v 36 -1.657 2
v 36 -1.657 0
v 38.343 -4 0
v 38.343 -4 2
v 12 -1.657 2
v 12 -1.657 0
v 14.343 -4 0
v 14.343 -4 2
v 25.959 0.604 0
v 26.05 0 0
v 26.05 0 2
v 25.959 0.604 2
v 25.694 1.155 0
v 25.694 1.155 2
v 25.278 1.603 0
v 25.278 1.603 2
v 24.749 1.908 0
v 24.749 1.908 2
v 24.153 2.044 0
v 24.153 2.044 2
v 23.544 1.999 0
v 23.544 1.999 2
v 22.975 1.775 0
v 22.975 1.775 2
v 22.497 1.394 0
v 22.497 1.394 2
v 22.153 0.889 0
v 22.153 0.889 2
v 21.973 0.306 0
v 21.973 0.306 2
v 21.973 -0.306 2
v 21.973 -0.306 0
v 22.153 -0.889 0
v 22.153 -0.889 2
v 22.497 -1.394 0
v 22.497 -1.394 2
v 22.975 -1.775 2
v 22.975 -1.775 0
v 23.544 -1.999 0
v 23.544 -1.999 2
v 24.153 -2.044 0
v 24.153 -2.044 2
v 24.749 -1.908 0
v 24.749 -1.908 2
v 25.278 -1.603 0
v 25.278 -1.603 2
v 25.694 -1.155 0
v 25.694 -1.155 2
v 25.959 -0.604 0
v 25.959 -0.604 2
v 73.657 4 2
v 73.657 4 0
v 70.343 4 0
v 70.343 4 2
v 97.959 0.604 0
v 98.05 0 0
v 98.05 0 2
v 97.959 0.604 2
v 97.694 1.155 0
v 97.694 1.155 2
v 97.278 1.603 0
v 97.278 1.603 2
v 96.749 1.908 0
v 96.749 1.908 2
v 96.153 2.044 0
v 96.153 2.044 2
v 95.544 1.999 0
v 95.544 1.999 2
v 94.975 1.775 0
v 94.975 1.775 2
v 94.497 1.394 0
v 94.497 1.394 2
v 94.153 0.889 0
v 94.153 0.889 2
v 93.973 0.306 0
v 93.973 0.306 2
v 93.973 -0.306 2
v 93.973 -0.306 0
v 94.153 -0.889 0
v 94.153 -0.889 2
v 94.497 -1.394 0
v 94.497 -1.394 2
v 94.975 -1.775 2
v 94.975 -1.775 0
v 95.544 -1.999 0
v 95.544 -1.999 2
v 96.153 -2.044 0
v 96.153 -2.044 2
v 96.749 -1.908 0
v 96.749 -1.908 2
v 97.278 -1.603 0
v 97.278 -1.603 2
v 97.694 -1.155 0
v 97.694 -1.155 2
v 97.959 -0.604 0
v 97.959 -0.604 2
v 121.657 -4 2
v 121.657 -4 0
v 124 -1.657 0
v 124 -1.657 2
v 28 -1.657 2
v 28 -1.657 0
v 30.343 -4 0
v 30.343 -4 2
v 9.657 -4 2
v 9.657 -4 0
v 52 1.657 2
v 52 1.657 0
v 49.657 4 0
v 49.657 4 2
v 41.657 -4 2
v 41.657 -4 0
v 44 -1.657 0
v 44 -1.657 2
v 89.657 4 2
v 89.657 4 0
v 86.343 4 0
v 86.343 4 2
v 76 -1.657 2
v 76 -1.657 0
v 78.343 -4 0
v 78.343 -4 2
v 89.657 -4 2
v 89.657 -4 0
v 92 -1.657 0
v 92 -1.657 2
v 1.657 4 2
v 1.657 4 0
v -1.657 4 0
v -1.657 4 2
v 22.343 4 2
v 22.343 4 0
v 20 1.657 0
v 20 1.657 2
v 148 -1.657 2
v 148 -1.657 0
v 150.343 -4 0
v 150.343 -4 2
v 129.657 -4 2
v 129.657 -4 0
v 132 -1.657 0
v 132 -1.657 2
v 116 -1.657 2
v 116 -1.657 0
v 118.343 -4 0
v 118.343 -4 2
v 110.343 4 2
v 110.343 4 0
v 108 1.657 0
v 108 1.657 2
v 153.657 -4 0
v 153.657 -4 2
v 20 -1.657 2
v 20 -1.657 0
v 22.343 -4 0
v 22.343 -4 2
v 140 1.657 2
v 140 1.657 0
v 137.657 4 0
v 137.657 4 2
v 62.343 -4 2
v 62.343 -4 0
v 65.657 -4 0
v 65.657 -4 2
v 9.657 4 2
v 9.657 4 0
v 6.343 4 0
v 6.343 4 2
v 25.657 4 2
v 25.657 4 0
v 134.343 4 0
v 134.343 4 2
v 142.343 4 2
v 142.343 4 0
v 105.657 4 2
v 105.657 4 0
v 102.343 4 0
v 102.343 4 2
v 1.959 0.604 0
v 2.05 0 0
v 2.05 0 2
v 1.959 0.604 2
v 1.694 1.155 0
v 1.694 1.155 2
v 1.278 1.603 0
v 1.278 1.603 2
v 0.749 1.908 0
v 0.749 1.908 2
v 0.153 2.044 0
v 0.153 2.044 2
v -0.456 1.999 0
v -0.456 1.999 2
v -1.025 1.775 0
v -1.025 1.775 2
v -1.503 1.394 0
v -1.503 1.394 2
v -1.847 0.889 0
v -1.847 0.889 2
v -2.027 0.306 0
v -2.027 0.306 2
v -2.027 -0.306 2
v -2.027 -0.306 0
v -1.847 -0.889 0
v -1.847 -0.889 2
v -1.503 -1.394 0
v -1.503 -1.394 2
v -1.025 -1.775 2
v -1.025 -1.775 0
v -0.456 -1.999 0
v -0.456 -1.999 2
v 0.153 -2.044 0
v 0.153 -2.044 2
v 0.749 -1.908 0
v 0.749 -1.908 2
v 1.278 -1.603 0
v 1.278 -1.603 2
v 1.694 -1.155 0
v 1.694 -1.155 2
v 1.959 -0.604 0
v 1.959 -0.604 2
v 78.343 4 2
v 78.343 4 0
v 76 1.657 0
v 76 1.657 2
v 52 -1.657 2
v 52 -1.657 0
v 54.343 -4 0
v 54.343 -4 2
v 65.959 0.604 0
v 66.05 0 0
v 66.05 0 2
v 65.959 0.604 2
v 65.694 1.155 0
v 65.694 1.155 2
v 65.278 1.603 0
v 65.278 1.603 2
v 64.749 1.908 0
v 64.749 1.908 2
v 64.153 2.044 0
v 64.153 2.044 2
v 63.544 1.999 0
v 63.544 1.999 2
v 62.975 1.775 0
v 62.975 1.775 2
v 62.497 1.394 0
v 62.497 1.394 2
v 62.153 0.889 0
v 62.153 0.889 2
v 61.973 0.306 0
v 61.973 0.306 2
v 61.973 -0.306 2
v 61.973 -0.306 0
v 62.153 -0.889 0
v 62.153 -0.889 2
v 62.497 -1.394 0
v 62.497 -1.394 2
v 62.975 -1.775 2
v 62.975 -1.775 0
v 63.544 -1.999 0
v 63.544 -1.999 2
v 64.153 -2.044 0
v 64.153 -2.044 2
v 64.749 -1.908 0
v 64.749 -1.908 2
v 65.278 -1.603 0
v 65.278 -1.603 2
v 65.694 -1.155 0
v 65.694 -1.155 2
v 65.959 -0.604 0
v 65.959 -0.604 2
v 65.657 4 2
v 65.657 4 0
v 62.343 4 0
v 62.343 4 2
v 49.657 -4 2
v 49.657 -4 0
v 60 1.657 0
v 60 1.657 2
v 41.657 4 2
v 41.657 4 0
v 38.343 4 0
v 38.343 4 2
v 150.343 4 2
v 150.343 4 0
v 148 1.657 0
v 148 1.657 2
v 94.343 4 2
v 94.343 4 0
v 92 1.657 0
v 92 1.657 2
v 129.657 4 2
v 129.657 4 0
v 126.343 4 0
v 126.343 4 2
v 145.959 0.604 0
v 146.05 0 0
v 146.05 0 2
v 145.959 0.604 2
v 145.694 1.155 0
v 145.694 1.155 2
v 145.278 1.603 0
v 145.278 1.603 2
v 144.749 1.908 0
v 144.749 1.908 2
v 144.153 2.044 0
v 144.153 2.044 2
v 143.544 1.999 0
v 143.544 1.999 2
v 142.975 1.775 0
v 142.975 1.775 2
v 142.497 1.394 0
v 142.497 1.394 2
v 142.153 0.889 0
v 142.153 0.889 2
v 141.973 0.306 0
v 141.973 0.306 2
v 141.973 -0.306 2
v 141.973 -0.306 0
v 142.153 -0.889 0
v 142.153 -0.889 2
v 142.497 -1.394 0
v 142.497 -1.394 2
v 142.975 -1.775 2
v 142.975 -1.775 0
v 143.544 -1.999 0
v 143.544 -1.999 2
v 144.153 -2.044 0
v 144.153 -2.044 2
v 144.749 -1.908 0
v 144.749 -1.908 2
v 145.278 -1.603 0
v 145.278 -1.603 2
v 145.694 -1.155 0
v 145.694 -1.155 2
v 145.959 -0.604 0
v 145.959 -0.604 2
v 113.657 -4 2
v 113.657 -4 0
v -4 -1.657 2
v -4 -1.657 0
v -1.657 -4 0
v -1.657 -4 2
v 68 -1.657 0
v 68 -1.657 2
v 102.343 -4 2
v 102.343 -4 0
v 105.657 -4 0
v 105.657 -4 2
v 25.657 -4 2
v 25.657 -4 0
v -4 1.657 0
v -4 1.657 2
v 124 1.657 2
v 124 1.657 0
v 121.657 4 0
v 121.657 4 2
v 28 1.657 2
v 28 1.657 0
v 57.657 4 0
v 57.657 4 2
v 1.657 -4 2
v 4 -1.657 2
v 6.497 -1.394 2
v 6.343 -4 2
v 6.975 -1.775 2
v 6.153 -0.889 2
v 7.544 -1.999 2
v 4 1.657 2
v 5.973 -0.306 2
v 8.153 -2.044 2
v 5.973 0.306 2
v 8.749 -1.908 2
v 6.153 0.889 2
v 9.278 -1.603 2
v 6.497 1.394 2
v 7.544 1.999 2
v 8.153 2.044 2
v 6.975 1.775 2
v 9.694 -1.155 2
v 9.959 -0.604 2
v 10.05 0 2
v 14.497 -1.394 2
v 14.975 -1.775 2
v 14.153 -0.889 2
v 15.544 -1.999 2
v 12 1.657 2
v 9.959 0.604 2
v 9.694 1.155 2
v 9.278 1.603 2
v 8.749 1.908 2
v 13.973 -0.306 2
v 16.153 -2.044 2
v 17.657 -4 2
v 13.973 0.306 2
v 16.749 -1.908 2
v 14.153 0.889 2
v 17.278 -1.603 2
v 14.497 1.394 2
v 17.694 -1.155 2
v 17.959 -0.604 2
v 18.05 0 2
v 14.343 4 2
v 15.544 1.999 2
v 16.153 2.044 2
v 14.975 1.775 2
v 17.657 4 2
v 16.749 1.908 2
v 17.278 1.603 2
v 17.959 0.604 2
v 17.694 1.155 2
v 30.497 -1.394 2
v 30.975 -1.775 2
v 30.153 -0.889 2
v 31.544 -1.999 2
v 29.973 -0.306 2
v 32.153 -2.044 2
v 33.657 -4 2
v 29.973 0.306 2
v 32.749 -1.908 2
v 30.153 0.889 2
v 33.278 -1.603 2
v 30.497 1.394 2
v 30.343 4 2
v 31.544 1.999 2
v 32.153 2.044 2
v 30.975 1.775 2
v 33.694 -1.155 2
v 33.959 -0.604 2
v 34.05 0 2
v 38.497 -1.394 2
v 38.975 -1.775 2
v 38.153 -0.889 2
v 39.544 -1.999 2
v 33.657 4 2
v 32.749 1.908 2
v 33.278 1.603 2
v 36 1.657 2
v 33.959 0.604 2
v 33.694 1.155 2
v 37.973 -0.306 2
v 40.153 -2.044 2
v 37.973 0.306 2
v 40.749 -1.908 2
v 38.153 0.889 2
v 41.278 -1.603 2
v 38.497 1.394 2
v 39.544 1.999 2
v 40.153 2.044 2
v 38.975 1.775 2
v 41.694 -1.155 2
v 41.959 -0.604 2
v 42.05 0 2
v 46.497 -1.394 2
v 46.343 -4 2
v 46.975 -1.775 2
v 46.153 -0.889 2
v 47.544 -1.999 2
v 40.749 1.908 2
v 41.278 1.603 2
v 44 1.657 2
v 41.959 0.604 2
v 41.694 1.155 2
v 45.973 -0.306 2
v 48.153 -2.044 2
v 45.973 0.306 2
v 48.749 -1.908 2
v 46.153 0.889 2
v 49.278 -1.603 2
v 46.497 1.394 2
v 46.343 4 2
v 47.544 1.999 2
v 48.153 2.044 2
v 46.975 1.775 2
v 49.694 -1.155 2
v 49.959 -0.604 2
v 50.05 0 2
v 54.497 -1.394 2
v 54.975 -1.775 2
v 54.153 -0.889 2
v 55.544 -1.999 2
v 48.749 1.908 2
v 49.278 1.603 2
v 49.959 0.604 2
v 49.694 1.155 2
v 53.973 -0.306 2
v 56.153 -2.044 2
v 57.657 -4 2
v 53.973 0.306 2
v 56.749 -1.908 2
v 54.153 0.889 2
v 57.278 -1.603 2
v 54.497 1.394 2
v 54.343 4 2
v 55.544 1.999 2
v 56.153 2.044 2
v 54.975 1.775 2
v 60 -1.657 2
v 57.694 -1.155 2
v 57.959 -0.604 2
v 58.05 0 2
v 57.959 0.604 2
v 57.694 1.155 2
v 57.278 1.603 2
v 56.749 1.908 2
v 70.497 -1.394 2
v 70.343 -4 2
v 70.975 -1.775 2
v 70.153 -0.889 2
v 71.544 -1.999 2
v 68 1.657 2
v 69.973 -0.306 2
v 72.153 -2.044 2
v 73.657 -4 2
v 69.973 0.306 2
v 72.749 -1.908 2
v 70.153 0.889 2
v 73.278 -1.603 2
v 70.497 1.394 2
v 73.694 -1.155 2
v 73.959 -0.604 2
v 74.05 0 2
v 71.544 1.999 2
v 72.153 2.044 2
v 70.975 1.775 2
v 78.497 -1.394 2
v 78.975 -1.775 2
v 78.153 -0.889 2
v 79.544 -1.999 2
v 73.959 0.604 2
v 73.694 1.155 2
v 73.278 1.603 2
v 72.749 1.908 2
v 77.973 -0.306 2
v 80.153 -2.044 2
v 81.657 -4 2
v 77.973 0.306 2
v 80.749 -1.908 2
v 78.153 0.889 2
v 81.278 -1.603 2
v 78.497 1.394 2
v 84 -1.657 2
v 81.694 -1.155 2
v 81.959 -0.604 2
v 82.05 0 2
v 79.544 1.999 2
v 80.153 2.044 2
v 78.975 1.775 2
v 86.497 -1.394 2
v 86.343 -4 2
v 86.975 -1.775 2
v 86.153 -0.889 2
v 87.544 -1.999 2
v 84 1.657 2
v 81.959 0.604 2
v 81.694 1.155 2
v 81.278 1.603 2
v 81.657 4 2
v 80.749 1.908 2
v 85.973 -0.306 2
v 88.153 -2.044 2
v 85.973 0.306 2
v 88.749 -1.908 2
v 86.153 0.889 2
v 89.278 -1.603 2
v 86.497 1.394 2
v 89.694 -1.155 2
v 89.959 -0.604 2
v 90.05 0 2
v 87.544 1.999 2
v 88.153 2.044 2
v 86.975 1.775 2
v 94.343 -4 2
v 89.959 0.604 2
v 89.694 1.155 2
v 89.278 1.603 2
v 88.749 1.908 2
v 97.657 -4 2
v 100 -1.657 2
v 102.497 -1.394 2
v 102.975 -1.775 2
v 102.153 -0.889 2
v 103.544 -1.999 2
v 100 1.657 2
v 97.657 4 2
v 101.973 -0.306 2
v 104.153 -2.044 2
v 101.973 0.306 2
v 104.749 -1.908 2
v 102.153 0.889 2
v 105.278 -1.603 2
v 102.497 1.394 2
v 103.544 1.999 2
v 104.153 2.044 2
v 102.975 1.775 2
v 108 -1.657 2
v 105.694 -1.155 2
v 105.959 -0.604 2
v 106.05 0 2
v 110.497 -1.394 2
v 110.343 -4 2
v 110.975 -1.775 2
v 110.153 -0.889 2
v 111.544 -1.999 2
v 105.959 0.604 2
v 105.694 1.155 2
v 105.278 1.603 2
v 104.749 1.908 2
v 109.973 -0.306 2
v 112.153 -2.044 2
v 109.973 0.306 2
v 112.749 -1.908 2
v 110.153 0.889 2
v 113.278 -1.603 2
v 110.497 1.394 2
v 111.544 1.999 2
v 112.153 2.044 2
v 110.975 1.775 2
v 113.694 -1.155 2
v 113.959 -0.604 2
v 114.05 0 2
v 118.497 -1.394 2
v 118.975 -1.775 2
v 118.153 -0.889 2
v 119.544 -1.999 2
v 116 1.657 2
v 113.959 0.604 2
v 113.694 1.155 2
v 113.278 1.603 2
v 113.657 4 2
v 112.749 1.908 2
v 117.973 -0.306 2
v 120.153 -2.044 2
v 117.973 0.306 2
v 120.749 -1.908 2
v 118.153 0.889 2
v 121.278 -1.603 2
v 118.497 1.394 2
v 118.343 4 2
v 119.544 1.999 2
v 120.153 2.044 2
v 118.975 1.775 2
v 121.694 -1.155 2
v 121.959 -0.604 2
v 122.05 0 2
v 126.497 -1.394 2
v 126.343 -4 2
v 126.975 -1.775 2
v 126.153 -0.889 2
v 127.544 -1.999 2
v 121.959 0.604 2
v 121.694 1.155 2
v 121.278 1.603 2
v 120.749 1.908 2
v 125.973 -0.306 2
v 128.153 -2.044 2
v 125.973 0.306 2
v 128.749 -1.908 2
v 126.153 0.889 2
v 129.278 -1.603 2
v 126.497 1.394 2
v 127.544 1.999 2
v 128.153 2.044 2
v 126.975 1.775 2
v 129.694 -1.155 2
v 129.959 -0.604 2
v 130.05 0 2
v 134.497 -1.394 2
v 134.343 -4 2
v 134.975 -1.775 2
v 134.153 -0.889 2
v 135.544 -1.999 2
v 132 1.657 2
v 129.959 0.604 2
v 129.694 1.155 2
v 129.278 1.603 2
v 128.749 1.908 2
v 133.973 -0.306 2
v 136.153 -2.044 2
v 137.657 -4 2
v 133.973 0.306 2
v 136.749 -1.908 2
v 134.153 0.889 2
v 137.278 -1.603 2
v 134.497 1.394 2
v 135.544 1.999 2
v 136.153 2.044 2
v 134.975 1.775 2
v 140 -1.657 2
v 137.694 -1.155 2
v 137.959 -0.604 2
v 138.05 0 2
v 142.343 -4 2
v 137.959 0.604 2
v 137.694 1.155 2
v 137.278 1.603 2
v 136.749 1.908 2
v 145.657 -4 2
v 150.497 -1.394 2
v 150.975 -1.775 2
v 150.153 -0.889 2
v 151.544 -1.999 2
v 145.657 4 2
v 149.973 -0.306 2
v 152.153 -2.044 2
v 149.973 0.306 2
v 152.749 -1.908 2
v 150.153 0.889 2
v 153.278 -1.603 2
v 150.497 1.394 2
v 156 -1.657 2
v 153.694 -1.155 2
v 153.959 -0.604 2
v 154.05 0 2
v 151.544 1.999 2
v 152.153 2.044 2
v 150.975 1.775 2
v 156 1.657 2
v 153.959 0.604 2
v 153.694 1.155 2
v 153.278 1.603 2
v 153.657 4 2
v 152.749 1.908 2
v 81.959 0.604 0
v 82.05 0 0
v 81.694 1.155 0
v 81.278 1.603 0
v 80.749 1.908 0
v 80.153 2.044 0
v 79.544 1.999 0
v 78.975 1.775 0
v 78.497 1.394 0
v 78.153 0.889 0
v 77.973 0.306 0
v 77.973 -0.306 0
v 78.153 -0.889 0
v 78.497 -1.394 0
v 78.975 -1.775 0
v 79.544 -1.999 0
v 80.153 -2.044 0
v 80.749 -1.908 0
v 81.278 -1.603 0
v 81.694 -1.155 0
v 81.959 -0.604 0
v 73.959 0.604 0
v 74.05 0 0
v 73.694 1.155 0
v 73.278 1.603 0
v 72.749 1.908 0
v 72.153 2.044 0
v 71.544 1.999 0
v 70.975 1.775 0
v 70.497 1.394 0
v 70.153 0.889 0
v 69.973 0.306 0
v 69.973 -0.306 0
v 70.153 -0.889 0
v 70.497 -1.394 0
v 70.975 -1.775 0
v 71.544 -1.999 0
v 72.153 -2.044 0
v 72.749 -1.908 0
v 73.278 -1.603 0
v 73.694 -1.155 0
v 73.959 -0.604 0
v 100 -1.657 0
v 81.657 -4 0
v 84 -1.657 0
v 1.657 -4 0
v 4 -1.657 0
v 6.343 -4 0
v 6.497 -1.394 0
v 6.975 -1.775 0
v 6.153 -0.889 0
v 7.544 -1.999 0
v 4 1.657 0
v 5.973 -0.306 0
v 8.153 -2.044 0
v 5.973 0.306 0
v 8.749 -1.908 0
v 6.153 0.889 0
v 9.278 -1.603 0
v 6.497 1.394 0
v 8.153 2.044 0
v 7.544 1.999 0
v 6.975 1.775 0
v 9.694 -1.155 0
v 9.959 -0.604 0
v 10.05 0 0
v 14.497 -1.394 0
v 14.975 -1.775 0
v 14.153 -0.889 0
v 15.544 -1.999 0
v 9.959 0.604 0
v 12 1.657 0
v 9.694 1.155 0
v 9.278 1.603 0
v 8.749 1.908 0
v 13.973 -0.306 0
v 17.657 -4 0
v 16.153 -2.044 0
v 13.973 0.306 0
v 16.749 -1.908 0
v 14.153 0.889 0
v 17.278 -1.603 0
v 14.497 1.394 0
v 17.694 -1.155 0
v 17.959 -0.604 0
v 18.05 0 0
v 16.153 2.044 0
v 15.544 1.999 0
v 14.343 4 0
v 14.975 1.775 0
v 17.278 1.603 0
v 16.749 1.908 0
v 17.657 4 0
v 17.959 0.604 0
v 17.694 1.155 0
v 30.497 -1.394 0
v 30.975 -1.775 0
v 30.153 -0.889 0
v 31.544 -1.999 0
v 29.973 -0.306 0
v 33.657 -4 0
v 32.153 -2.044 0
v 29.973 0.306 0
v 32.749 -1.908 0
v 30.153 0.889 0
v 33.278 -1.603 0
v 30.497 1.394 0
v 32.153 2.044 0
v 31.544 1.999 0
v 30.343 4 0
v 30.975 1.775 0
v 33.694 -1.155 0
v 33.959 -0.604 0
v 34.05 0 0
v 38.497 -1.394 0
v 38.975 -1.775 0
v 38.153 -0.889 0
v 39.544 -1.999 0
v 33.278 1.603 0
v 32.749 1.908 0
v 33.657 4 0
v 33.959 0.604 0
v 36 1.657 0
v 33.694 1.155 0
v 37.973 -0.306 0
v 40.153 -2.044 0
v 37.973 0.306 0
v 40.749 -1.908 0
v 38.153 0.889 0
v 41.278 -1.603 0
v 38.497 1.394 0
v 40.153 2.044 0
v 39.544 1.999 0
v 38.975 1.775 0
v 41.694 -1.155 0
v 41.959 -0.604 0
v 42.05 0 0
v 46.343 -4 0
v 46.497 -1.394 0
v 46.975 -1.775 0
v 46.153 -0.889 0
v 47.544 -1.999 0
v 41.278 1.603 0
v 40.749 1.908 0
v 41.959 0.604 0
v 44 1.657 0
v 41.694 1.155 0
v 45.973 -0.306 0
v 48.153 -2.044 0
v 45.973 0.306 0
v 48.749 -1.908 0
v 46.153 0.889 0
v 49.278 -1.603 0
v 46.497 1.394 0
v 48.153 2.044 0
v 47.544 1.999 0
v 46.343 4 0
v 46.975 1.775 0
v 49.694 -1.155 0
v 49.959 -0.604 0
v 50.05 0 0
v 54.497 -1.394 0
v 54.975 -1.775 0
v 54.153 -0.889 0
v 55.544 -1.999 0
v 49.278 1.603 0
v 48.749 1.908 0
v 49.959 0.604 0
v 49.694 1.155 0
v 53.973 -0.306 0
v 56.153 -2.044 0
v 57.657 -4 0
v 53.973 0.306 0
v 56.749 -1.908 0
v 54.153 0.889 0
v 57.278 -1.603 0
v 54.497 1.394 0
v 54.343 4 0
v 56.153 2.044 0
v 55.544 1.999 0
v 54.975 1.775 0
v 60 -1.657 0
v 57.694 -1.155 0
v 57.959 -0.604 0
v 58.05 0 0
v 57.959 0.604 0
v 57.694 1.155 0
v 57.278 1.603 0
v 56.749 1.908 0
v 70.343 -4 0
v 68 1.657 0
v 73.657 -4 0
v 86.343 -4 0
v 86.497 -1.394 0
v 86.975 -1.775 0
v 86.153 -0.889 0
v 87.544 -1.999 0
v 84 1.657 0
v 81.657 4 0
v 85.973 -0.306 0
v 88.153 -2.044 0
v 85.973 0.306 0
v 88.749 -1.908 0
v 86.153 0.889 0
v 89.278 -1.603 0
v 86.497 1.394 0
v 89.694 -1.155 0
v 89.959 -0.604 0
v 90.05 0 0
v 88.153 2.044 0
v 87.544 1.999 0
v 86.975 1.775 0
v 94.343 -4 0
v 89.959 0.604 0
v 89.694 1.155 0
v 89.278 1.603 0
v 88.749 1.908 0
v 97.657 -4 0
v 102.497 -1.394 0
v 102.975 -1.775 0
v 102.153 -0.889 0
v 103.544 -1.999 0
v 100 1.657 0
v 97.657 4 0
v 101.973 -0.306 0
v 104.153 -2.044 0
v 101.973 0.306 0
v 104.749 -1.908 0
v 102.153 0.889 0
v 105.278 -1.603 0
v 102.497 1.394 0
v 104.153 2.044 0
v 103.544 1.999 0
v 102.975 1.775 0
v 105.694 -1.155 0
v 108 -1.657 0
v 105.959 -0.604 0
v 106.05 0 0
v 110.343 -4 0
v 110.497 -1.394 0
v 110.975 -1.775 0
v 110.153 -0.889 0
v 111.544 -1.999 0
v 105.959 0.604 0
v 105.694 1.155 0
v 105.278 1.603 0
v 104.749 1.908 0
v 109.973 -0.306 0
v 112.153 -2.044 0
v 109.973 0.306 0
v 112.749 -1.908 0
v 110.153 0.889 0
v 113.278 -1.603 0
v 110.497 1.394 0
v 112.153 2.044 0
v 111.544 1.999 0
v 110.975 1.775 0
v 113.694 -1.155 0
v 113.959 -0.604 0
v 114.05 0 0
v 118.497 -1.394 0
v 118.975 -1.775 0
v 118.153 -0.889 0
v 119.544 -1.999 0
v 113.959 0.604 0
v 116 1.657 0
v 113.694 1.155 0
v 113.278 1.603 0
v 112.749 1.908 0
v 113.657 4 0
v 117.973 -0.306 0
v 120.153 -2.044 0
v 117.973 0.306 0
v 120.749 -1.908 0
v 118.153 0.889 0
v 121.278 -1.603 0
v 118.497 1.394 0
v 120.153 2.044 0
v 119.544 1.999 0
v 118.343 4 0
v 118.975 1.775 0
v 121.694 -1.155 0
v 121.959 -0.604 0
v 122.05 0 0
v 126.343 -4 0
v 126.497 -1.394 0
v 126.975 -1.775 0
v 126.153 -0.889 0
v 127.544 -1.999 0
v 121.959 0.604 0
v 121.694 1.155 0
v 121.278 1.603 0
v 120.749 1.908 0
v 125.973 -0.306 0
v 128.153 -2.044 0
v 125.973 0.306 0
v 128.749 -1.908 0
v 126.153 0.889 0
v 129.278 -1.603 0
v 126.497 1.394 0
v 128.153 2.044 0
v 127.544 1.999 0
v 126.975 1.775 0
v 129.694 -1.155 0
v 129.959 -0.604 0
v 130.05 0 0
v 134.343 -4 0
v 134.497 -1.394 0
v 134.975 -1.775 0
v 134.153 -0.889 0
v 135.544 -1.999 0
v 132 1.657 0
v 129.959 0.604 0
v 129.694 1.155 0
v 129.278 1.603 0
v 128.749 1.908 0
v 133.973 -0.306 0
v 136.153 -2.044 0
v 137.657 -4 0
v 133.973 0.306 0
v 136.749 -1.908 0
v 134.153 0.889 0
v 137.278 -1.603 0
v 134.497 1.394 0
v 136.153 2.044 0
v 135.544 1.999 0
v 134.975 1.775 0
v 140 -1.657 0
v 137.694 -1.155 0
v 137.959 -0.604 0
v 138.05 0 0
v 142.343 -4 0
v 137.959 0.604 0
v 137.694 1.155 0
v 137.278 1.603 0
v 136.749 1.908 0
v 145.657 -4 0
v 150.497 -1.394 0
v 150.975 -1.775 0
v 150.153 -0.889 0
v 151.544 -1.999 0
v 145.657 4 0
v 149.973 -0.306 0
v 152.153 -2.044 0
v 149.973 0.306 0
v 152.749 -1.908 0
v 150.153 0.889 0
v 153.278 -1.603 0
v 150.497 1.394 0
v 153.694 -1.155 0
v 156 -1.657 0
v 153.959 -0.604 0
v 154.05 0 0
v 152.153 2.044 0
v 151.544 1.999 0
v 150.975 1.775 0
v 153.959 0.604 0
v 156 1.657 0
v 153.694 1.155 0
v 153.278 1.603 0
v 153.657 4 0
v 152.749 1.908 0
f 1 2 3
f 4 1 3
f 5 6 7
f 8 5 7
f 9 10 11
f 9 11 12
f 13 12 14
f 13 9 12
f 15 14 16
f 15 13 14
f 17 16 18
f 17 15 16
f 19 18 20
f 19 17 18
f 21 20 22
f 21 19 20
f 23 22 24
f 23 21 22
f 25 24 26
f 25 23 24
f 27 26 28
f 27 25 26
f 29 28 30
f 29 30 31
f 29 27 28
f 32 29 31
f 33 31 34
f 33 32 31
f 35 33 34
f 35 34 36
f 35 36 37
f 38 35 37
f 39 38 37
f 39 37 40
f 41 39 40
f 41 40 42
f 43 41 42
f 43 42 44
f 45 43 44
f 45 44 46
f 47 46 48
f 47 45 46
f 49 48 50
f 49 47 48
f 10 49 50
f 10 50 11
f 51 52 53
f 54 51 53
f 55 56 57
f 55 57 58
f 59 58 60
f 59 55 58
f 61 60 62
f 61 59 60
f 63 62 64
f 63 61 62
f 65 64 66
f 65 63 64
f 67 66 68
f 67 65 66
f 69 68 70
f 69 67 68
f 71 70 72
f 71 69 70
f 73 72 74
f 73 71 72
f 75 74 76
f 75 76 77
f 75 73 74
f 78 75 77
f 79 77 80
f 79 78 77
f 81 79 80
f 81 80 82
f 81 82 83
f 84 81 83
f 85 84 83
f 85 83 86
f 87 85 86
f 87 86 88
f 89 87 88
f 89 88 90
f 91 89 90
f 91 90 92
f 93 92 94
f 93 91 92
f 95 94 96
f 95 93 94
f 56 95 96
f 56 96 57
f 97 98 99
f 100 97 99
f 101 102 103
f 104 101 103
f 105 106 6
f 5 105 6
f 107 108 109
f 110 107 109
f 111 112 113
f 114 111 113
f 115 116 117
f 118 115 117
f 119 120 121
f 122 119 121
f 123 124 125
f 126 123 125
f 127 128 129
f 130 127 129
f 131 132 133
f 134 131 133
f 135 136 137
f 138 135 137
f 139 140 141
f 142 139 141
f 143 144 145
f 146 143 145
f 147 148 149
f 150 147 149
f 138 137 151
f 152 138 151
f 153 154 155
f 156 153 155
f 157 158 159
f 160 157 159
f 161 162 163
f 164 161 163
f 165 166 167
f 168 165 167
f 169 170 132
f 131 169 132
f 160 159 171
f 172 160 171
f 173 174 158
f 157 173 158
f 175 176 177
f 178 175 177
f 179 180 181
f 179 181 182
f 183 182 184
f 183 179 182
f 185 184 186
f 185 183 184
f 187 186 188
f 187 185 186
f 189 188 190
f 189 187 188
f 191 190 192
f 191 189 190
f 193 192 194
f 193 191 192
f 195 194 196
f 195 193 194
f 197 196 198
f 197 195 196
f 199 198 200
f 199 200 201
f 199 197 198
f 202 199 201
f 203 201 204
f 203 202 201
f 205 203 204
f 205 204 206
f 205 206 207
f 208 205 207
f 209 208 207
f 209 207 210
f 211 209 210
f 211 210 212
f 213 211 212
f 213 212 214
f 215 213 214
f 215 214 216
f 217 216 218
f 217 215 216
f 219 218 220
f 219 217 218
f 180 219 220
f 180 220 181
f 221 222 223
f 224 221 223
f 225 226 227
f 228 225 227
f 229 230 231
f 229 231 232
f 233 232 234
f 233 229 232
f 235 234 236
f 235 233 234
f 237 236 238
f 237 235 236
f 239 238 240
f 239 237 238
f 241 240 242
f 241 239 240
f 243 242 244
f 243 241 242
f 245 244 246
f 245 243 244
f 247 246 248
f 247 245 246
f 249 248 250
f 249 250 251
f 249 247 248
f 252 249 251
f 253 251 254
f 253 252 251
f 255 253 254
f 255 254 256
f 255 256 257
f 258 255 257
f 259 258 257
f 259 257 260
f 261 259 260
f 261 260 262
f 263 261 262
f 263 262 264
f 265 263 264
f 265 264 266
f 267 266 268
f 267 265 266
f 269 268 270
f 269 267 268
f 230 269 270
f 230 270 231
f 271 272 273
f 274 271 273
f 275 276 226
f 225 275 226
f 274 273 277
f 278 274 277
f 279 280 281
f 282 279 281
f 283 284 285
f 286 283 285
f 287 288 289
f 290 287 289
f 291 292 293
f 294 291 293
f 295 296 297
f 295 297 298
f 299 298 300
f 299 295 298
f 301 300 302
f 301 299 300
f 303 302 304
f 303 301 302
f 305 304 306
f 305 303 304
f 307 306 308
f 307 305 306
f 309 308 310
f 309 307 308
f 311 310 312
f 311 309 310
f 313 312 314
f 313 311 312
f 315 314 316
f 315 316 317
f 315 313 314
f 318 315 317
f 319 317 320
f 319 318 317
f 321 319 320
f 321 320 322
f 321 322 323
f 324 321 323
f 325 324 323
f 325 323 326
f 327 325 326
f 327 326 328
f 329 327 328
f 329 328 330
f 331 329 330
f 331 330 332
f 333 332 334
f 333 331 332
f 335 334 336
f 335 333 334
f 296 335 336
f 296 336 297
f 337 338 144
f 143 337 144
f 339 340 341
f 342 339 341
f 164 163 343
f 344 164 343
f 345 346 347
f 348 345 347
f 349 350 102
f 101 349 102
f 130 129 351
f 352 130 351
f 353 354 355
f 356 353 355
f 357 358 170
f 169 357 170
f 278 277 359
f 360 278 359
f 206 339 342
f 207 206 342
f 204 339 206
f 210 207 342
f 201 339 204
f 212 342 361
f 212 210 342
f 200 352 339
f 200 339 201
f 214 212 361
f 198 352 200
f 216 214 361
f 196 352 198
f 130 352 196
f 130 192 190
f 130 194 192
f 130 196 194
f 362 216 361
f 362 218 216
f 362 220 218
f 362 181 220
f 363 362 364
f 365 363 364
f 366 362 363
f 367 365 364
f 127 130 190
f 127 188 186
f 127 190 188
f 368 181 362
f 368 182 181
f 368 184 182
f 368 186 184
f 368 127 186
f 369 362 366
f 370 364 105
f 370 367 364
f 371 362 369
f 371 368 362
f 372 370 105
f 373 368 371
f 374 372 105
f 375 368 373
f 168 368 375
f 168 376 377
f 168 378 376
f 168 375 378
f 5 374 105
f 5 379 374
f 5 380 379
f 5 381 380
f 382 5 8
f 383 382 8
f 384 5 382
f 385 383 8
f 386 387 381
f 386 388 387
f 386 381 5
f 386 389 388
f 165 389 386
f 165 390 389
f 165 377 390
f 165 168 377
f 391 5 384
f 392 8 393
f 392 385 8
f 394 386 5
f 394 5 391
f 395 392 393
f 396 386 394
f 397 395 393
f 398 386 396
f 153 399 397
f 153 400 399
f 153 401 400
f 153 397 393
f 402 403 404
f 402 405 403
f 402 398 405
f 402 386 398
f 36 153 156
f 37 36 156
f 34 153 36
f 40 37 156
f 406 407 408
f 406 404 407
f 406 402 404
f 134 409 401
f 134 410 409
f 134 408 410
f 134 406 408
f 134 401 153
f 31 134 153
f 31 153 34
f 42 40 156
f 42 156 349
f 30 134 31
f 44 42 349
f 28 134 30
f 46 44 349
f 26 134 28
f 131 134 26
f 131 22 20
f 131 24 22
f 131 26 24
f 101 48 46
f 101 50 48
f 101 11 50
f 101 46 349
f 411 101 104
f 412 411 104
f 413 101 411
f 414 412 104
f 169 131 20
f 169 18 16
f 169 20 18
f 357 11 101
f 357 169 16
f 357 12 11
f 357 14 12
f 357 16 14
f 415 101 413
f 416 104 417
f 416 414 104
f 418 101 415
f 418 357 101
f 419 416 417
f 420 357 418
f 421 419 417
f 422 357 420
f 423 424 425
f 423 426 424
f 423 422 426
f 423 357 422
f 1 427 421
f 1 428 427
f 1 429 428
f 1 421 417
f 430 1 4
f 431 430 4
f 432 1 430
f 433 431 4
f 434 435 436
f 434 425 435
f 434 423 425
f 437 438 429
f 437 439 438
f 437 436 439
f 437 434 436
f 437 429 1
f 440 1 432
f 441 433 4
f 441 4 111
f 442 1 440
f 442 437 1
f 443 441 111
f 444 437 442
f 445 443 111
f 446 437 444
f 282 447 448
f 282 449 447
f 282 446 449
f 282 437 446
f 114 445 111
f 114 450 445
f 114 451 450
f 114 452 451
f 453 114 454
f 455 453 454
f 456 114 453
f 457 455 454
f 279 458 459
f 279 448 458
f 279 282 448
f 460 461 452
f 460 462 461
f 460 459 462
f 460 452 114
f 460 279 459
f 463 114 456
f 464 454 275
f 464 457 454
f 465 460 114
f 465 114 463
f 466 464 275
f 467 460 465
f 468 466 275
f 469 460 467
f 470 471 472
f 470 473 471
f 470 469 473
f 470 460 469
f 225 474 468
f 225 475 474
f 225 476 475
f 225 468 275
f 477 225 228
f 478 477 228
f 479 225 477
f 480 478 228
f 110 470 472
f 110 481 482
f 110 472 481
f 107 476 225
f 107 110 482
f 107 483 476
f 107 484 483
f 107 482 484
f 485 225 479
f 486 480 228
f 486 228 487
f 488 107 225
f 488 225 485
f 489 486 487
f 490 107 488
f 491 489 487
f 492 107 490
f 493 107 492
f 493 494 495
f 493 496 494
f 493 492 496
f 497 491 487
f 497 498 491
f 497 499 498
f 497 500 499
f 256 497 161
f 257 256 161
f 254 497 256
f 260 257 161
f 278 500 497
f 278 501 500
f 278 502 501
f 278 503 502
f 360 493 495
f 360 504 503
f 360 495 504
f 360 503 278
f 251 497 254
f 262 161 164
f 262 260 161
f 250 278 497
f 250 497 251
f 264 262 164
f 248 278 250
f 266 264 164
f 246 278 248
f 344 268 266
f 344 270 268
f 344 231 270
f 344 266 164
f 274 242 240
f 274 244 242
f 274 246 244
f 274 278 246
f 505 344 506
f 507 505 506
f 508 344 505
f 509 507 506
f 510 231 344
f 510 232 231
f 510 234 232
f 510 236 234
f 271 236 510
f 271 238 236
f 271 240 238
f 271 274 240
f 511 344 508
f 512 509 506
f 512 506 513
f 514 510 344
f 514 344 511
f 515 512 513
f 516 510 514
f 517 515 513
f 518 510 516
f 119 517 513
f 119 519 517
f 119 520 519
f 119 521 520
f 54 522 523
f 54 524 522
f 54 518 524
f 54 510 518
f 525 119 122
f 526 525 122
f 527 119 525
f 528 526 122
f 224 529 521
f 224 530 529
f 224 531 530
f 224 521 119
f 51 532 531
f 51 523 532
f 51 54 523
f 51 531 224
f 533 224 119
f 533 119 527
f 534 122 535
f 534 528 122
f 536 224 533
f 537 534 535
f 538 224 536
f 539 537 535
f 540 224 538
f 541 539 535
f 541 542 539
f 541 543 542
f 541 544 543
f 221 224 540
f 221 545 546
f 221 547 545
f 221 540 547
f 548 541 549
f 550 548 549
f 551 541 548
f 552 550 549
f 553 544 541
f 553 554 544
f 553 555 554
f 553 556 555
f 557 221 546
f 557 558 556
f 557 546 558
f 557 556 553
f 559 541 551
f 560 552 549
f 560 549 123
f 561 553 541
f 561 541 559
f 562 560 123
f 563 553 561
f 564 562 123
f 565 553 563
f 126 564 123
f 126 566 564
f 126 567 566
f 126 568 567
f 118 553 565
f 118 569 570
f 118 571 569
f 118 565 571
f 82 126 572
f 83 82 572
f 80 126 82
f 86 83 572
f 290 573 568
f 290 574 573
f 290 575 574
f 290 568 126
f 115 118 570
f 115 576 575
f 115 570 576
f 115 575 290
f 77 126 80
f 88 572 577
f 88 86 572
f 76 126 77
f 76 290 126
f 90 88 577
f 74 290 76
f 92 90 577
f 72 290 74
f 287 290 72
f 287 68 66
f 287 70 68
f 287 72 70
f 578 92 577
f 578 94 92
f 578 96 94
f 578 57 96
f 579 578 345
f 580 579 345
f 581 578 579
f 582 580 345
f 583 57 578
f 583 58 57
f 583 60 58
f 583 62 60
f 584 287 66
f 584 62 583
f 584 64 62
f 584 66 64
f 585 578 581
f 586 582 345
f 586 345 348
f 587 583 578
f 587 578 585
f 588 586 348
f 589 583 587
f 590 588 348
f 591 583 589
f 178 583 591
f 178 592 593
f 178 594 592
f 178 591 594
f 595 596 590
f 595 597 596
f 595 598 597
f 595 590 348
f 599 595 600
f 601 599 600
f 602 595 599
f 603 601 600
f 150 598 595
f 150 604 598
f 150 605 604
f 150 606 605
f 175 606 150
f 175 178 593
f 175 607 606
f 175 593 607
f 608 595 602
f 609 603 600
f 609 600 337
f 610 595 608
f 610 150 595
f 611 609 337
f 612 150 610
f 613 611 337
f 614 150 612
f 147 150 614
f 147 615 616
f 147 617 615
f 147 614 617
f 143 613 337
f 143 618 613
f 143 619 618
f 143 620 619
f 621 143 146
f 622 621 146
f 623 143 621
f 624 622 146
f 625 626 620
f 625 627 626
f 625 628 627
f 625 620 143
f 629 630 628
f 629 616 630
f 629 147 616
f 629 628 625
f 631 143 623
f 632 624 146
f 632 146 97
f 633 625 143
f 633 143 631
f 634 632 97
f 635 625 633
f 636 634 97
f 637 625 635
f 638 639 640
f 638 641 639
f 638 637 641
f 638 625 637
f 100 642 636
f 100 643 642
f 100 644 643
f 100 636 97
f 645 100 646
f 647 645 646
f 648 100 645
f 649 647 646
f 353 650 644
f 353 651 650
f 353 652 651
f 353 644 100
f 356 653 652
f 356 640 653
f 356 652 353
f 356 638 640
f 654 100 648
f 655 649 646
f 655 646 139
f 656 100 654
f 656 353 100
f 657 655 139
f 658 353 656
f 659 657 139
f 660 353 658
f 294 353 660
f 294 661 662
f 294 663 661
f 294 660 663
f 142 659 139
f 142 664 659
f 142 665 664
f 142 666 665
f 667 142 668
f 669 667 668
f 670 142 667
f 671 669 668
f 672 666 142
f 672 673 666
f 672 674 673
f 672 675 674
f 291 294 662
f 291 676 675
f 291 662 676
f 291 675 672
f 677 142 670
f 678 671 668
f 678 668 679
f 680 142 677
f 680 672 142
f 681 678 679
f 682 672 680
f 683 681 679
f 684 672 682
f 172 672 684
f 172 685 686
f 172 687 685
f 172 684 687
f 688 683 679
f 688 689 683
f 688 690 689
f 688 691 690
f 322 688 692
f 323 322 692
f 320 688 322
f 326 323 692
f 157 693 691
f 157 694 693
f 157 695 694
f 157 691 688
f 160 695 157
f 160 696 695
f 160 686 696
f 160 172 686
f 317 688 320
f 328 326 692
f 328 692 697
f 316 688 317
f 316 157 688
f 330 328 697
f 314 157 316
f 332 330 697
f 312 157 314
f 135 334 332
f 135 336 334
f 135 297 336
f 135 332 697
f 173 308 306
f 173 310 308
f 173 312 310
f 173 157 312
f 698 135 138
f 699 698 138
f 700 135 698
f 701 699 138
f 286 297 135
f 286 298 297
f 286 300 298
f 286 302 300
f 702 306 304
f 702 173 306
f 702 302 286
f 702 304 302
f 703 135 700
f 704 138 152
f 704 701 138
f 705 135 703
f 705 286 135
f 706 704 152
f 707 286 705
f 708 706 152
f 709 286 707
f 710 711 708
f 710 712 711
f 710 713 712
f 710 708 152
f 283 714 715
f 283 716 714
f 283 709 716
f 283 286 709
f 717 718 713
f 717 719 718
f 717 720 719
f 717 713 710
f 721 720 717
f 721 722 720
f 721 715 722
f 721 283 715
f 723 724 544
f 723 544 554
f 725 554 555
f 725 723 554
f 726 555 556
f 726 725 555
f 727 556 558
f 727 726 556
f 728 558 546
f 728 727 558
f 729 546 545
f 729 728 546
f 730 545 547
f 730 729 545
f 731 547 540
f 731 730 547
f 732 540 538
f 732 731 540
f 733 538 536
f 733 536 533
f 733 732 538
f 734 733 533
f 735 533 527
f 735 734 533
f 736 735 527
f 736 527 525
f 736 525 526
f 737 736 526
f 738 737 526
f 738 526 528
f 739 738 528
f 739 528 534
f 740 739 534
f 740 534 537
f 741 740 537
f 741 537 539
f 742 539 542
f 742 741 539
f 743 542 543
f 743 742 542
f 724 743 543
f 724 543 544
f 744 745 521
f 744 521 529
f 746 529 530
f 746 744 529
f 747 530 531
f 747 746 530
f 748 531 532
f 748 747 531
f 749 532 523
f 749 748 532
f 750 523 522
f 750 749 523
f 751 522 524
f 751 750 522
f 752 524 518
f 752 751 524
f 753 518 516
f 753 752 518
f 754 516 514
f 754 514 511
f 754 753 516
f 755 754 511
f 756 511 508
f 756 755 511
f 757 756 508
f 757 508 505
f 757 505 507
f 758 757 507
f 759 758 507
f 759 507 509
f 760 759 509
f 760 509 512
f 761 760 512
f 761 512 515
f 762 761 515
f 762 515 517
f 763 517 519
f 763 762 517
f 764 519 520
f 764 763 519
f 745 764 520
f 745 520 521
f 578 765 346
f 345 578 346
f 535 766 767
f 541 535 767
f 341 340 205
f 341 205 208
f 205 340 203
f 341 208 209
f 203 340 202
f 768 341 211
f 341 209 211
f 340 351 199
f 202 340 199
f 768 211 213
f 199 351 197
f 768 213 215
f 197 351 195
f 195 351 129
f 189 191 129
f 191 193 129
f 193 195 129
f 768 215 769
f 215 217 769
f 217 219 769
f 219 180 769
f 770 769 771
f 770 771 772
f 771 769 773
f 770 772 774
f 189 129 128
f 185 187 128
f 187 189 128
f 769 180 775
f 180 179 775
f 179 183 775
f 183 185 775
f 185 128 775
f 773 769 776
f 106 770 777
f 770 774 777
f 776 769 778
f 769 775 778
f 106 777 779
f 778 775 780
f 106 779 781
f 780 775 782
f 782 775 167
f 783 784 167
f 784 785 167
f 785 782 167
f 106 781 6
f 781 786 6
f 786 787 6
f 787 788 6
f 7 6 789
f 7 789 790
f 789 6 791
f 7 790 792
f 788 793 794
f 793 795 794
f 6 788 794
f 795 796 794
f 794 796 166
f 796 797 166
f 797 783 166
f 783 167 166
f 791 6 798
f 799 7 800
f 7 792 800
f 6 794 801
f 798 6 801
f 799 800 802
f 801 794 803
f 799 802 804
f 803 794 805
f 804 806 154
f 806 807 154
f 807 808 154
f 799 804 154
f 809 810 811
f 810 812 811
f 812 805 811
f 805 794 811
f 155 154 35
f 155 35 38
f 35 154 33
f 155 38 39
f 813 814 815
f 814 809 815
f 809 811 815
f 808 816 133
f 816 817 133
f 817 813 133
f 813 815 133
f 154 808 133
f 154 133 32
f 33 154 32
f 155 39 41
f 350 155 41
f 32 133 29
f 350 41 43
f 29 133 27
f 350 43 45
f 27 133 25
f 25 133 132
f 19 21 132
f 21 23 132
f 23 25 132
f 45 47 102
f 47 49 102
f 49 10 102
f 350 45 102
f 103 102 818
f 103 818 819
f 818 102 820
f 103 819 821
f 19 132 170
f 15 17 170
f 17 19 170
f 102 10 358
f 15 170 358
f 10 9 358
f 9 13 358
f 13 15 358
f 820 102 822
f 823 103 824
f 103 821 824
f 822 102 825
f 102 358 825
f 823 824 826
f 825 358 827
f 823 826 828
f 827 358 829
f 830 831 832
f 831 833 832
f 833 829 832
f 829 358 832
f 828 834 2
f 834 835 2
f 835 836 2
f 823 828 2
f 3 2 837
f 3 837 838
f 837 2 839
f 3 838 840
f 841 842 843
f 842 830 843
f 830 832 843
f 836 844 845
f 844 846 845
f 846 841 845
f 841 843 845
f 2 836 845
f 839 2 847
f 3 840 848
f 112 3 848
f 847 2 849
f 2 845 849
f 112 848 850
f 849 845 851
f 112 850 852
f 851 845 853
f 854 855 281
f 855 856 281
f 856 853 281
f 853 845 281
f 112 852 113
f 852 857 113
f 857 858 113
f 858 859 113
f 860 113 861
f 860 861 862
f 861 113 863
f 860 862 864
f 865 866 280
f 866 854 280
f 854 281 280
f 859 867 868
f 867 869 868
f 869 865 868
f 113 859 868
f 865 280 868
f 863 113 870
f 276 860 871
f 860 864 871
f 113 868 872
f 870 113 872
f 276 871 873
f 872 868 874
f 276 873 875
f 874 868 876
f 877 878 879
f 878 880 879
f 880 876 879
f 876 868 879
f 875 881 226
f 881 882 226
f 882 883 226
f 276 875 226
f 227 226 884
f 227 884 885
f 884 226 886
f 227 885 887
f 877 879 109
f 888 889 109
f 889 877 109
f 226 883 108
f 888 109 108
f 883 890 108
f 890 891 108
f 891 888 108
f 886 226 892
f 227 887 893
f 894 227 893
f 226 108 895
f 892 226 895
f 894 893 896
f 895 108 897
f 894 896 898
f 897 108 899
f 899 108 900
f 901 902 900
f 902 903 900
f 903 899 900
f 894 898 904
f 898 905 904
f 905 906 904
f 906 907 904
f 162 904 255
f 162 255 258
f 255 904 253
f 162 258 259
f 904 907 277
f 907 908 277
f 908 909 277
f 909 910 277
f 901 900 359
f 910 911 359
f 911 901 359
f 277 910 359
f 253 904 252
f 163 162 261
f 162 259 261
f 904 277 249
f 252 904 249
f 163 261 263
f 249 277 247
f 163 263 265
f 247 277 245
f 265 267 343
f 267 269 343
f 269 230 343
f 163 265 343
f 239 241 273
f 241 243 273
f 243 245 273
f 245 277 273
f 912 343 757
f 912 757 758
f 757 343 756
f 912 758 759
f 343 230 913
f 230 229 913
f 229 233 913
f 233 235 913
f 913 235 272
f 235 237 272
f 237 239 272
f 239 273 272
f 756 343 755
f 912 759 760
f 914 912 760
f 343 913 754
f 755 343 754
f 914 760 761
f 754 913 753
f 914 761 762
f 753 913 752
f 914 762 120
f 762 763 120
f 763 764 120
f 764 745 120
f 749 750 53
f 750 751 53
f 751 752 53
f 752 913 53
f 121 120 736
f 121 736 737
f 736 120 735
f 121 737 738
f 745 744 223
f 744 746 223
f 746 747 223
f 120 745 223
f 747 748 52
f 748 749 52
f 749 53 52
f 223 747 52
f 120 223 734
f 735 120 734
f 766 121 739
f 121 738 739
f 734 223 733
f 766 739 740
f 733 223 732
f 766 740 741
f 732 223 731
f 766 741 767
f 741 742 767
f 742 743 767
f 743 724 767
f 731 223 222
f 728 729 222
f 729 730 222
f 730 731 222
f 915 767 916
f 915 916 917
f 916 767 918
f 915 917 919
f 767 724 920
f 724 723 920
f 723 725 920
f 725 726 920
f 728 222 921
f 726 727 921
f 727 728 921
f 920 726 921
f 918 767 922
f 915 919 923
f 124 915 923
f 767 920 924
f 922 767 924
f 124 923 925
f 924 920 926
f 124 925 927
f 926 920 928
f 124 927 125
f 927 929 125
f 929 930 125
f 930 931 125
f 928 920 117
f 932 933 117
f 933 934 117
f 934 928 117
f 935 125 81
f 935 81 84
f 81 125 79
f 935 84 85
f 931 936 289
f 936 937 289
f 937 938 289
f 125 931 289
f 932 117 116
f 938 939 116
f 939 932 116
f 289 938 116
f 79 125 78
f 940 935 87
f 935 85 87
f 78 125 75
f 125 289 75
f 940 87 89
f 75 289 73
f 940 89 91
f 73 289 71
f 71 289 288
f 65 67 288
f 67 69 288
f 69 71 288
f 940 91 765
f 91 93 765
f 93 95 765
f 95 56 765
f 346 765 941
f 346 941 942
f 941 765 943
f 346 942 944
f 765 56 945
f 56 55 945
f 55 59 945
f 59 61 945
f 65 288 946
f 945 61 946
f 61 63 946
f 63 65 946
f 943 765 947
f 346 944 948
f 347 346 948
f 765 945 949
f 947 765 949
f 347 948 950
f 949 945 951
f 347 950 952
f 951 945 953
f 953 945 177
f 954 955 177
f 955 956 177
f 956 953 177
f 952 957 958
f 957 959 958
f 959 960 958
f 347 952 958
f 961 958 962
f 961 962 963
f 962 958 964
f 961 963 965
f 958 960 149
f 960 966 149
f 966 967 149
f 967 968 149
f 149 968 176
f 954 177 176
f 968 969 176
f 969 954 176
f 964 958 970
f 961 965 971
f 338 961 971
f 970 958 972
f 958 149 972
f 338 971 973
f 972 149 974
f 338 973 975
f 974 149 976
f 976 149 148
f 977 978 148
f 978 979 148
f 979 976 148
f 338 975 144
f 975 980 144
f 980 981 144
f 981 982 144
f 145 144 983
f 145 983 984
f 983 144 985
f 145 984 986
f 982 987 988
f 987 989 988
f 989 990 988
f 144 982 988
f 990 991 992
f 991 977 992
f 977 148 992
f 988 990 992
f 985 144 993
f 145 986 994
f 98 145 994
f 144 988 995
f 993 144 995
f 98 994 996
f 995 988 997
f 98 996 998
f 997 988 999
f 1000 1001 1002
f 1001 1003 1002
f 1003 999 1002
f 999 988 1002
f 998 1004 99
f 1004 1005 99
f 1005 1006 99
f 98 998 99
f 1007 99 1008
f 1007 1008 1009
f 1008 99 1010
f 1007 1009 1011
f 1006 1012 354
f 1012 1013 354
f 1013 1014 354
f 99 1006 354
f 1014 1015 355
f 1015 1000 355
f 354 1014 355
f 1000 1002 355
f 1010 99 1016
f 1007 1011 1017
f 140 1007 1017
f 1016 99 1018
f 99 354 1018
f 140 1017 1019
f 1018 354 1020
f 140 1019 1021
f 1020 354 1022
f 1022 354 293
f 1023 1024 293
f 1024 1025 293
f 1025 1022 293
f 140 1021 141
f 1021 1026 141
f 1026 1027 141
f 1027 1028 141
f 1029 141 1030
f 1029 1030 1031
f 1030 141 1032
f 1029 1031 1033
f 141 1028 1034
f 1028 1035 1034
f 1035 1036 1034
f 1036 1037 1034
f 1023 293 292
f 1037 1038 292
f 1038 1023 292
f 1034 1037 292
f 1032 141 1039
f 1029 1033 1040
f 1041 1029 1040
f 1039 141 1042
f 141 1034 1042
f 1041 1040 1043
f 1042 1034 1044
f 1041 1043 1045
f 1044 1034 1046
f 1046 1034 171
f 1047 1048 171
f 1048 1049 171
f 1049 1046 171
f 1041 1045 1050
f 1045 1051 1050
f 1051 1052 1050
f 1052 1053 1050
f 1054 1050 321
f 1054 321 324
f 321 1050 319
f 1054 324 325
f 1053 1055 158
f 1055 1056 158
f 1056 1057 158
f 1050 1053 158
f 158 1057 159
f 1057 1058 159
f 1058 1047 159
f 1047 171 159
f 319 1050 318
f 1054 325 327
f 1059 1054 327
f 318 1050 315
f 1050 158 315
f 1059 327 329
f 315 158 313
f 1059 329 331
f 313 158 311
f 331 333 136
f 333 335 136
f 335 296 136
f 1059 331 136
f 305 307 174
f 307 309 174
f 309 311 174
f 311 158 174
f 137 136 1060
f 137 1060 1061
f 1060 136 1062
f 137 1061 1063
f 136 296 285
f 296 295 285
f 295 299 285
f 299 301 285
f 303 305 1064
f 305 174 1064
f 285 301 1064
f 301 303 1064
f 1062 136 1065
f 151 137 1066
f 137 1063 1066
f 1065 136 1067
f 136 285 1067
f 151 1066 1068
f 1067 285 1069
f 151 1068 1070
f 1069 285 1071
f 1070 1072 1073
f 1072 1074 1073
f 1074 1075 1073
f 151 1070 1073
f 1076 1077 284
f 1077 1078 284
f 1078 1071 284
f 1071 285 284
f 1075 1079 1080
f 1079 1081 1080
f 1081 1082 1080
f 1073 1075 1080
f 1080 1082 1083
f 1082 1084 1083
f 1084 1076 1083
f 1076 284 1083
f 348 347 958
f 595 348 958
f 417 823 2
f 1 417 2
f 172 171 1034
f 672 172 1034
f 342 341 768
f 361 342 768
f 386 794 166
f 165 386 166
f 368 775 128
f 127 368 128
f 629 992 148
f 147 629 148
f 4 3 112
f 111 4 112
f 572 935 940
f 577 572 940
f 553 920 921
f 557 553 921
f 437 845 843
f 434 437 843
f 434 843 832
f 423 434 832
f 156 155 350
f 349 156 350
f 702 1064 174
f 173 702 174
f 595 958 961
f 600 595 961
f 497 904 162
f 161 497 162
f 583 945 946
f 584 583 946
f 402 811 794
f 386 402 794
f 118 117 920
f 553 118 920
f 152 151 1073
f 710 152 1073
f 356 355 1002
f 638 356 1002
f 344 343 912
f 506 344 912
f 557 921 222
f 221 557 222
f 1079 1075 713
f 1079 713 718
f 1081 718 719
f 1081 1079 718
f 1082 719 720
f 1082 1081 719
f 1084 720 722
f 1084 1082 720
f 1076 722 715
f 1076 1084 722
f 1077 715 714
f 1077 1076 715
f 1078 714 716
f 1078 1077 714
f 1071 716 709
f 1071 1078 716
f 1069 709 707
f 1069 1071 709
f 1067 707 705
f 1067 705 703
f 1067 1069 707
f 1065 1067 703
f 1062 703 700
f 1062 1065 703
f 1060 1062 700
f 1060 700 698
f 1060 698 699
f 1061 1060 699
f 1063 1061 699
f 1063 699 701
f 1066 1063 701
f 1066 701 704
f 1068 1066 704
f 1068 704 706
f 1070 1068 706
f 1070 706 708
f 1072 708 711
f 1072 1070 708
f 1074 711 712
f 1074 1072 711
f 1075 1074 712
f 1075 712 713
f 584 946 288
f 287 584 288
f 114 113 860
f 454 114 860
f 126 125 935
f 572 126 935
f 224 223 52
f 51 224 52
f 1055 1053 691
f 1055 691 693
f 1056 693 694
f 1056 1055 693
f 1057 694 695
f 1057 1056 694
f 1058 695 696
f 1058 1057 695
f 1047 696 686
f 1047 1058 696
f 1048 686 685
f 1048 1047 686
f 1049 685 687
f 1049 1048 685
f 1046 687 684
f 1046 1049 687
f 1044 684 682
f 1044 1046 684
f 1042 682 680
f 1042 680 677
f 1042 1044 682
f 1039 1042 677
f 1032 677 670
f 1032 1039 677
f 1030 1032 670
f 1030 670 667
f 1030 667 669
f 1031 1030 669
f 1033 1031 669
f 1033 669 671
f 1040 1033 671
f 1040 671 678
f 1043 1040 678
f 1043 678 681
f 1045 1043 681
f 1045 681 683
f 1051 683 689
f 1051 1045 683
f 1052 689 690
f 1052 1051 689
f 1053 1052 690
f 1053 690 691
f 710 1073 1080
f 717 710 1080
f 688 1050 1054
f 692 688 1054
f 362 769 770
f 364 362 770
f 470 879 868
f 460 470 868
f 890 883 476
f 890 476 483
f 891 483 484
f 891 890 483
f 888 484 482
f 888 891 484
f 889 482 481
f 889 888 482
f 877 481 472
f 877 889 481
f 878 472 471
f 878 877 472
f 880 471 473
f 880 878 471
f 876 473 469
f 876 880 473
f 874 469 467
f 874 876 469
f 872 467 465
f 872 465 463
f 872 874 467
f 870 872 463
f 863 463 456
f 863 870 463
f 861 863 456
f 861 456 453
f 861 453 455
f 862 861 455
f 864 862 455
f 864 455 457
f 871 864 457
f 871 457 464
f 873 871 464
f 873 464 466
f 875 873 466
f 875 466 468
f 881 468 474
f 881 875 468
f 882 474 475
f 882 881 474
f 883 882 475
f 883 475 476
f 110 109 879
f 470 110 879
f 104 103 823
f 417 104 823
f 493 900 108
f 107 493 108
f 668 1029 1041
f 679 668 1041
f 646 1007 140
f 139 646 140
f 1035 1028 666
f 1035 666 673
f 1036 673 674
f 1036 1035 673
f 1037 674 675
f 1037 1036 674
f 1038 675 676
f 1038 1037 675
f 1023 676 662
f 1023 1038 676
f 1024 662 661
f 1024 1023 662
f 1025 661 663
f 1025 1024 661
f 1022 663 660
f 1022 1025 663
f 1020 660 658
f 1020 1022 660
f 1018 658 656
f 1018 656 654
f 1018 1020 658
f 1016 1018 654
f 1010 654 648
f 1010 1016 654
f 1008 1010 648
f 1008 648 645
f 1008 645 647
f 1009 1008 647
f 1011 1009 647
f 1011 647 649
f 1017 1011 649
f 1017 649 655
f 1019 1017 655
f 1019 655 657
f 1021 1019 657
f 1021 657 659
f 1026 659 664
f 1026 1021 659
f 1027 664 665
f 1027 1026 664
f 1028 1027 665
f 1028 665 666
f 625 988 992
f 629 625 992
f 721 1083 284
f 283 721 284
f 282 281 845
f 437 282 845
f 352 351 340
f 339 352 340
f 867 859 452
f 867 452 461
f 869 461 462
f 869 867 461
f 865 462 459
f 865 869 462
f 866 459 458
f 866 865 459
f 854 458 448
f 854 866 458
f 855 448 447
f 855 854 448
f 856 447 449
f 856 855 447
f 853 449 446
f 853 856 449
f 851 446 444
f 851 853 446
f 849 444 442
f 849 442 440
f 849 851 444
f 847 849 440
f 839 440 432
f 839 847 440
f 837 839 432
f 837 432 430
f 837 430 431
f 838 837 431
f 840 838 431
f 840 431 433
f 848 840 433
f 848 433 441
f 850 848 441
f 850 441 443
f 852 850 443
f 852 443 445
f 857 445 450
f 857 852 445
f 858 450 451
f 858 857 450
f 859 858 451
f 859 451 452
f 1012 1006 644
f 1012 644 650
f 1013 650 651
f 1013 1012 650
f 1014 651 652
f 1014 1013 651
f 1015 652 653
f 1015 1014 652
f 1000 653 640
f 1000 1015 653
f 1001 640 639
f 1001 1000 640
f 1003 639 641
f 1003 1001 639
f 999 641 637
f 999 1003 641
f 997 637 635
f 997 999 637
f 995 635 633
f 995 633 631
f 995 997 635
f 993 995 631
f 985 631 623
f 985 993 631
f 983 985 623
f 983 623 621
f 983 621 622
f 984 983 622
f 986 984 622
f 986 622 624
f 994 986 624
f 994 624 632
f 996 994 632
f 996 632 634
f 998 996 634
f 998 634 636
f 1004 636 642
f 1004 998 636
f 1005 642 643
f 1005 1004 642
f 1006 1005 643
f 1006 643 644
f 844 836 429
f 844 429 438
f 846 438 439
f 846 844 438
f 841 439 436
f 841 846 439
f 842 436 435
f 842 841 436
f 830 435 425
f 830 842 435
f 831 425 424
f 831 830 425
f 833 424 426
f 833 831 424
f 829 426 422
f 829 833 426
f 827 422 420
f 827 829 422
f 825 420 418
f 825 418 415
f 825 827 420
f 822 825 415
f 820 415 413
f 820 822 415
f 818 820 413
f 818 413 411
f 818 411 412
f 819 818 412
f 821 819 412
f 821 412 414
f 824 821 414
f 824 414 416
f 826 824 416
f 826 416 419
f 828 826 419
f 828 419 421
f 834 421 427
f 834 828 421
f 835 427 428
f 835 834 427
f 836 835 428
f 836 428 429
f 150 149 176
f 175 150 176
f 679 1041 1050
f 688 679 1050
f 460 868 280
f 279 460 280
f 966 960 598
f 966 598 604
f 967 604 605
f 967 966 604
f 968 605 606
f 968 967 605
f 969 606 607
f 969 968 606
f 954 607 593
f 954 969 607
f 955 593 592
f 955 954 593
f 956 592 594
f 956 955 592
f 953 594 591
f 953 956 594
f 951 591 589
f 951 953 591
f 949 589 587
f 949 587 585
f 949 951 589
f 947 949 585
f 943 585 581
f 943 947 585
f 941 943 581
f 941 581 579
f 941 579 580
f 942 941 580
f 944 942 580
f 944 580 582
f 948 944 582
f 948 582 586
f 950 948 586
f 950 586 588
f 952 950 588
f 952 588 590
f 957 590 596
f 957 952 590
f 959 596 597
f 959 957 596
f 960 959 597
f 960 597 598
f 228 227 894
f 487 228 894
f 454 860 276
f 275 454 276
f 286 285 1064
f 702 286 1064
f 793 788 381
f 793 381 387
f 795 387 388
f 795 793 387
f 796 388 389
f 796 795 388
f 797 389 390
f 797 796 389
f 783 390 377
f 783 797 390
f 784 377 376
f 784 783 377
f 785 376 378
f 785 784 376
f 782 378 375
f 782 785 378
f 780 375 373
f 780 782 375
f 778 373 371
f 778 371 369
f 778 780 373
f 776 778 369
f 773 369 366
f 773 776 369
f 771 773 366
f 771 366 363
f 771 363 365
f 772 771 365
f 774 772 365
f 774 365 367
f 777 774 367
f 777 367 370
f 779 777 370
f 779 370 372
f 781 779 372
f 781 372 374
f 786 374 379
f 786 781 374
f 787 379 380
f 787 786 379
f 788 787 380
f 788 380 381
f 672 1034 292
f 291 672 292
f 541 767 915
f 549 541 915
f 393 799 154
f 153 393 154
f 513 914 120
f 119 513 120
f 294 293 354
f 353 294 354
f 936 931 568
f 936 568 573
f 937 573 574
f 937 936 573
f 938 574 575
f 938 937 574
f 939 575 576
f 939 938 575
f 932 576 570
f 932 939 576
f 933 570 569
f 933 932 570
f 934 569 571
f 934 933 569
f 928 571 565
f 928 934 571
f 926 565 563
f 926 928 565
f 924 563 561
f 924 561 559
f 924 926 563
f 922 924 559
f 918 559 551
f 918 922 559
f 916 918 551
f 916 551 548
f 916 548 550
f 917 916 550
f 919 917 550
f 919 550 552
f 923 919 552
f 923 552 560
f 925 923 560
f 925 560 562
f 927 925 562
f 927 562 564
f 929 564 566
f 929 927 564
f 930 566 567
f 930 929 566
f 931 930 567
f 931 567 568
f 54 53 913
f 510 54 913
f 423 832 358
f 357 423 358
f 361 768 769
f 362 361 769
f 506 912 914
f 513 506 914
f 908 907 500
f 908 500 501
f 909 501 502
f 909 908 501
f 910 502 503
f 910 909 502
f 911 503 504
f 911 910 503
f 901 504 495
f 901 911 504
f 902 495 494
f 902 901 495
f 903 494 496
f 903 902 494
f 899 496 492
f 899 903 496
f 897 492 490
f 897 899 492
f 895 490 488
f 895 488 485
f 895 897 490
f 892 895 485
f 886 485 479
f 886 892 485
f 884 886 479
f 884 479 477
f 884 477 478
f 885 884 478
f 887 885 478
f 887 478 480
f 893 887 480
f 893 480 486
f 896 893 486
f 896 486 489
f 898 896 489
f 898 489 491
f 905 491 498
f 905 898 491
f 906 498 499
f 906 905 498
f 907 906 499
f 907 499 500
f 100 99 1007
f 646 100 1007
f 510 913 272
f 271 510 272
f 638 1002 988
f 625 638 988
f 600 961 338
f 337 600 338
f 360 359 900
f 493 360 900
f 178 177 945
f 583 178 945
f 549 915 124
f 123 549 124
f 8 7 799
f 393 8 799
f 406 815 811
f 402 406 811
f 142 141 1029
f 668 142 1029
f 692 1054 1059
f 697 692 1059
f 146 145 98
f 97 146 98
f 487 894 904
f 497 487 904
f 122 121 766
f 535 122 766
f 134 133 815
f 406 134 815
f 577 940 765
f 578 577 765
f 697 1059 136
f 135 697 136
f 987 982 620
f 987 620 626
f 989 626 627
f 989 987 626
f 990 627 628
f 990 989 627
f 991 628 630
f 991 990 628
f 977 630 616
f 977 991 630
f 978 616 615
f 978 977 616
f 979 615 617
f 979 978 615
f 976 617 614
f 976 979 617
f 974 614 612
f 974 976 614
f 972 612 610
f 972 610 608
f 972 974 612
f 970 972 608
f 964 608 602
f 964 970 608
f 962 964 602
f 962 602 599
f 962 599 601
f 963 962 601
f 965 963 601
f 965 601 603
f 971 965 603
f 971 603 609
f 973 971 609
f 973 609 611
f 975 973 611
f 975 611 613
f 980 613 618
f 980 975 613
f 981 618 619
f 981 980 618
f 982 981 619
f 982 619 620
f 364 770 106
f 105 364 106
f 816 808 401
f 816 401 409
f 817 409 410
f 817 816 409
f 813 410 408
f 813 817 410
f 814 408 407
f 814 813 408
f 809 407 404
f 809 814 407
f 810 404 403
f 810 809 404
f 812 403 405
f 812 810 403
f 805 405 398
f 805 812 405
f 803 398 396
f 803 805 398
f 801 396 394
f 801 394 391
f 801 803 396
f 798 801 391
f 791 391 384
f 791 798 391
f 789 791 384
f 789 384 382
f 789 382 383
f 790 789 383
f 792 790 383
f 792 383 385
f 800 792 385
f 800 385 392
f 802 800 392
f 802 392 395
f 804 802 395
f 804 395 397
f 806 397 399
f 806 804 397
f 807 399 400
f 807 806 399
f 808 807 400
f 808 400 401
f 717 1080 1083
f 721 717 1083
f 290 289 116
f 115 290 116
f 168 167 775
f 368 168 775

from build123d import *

# Parameters (mm, degrees)
SKETCH1_R           = 2.05
BOSS_EXTRUDE1_DEPTH = 2
LPATTERN1_COUNT     = 20
LPATTERN1_PITCH     = 8


with BuildPart() as part:
    # Sketch1 → Boss-Extrude1 (new body)
    with BuildSketch(Plane.XY):
        Polygon((1.656854249, 4), (-1.656854249, 4), (-4, 1.656854249), (-4, -1.656854249), (-1.656854249, -4), (1.656854249, -4), (4, -1.656854249), (4, 1.656854249), align=None)
        Circle(SKETCH1_R, mode=Mode.SUBTRACT)
    boss_extrude1 = extrude(amount=BOSS_EXTRUDE1_DEPTH)

    # LPattern1: Boss-Extrude1 ×20
    with Locations(*[(i * LPATTERN1_PITCH, 0, 0) for i in range(1, LPATTERN1_COUNT)]):
        add(boss_extrude1)


solid = part.part
